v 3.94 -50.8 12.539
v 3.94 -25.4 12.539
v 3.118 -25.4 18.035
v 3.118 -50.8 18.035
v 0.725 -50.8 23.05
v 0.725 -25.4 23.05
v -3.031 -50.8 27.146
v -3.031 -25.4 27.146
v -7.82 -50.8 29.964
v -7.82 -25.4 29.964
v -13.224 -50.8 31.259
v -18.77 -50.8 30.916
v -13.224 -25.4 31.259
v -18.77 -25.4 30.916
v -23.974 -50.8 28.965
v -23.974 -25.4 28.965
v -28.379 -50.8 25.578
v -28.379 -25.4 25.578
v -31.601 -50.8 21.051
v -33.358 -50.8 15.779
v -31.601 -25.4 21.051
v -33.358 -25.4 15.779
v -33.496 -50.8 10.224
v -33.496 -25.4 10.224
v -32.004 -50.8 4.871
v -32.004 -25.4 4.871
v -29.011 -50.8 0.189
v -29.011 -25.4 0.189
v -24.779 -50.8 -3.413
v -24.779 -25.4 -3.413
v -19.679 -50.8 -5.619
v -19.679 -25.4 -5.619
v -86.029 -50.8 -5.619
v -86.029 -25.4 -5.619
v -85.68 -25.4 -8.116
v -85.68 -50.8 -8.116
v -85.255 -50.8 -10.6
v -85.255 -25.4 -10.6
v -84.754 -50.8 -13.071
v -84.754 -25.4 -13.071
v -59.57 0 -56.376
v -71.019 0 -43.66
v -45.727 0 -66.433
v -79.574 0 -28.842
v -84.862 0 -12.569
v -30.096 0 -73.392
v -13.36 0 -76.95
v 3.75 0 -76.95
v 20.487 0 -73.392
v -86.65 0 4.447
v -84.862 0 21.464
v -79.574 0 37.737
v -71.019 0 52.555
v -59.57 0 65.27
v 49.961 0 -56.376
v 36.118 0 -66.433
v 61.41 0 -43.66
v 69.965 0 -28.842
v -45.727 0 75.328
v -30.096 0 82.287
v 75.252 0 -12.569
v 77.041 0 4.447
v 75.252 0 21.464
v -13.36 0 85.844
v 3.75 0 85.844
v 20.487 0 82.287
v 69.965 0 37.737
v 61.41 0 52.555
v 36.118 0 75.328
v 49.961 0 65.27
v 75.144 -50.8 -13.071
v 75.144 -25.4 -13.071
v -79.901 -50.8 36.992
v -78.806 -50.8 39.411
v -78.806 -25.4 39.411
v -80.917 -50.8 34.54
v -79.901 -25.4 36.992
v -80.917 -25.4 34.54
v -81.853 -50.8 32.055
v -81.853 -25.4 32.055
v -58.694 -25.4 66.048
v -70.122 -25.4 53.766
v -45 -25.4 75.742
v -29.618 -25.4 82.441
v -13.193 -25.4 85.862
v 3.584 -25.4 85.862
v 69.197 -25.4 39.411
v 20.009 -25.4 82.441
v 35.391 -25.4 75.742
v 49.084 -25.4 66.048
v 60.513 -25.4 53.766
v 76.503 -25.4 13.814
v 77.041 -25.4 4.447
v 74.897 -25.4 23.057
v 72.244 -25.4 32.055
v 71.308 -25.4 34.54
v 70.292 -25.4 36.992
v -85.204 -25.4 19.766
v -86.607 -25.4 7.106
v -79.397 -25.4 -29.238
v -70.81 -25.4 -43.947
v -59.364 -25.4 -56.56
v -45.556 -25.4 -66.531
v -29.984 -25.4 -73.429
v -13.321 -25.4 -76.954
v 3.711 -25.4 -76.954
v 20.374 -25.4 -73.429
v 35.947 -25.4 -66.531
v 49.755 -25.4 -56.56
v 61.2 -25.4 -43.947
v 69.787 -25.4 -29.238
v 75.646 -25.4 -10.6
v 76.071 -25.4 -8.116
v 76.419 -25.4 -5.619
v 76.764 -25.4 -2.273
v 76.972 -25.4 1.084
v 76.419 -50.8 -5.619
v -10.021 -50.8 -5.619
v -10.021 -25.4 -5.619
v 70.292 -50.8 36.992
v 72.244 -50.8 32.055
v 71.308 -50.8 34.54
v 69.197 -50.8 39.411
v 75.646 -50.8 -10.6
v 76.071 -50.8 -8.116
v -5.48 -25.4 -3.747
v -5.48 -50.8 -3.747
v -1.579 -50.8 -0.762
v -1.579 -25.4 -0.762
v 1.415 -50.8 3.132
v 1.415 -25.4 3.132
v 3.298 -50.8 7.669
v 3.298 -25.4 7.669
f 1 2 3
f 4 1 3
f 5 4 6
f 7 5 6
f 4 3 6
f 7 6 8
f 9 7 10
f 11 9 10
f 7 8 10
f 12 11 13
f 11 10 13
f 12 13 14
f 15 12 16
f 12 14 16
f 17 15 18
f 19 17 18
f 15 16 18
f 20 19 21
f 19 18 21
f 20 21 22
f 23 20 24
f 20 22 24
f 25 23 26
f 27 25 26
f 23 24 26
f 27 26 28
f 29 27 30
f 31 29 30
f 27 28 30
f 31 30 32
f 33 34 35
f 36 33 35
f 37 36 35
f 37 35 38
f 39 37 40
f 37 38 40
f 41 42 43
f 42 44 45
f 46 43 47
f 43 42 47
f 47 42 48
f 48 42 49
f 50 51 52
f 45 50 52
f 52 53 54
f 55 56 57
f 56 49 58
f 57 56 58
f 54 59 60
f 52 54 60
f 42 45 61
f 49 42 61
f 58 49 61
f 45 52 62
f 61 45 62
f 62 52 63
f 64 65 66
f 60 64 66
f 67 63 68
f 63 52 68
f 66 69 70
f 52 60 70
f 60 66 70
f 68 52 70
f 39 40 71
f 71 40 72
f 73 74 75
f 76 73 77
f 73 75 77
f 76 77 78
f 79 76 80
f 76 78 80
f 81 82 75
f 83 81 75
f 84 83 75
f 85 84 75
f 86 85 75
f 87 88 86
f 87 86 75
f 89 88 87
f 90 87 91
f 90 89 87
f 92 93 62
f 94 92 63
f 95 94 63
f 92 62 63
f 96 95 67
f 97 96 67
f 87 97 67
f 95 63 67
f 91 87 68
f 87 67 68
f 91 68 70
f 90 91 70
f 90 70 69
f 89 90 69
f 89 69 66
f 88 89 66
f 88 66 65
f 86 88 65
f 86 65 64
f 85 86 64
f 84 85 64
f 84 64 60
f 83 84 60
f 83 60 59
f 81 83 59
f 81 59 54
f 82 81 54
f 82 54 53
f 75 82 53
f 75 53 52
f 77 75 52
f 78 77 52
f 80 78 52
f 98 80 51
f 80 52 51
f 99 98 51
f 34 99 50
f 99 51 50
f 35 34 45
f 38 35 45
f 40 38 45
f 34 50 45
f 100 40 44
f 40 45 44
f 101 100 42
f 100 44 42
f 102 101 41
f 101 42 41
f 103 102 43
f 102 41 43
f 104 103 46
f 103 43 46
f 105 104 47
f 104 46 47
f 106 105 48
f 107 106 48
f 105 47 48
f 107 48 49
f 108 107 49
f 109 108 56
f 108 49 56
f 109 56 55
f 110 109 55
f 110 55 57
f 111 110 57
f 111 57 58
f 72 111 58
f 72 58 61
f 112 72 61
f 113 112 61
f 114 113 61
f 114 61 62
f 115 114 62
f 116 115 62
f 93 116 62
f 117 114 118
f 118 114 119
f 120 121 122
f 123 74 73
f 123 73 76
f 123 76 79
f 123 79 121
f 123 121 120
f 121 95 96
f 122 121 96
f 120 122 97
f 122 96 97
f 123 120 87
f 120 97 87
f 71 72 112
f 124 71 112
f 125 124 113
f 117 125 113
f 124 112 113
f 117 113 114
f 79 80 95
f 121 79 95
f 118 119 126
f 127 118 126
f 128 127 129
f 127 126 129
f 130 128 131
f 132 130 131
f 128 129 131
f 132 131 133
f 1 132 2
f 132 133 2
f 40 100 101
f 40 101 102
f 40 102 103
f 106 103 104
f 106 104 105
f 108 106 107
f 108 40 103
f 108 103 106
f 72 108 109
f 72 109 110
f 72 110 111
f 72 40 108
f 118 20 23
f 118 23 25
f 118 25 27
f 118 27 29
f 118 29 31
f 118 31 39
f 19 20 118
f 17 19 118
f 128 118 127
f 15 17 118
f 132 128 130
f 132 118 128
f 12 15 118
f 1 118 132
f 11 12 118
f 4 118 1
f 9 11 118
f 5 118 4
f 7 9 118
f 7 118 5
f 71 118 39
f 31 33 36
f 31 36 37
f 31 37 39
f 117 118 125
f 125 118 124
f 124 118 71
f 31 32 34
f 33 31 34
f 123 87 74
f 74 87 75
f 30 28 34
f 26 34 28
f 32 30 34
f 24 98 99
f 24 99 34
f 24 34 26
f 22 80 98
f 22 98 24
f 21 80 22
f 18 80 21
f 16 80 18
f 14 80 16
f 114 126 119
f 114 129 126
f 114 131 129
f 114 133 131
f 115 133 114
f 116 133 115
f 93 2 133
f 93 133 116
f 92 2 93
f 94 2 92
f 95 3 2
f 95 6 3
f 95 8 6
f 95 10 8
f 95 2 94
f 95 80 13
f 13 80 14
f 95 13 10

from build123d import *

# Parameters (mm, degrees)
F0_R     = 81.8455494857
F1_DEPTH = 25.4
F3_DEPTH = 25.4


with BuildPart() as f1:
    # F0 (on Front) → F1 (new body)
    with BuildSketch(Plane.XZ):
        with Locations((-4.8047169112, 4.4472948648)):
            Circle(F0_R)
    extrude(amount=F1_DEPTH)

    # F2 (on face) → F3 (join)
    with BuildSketch(Plane.XZ.offset(25.4)):
        with BuildLine():
            ThreePointArc((-10.0211519488, -5.6191812157), (0.0460571122, 1.0869034824), (3.9396910589, 12.539409101))
            ThreePointArc((3.9396910589, 12.539409101), (-26.3024943623, 27.4354549568), (-19.6788255386, -5.6191812157))
            Line((-19.6788255386, -5.6191812157), (-10.0211519488, -5.6191812157))
        make_face()
        with BuildLine():
            Line((-10.0211519488, -5.6191812157), (-19.6788255386, -5.6191812157))
            ThreePointArc((-19.6788255386, -5.6191812157), (-14.8499887437, -6.2502707016), (-10.0211519488, -5.6191812157))
        make_face()
        with BuildLine():
            ThreePointArc((-78.8063776433, 39.4108212817), (-80.4193323461, 35.7701922921), (-81.8533073255, 32.0554220338))
            Line((-81.8533073255, 32.0554220338), (72.2438735032, 32.0554220338))
            ThreePointArc((72.2438735032, 32.0554220338), (70.8098985238, 35.7701922921), (69.1969438209, 39.4108212817))
            Line((69.1969438209, 39.4108212817), (-78.8063776433, 39.4108212817))
        make_face()
        with BuildLine():
            Line((-19.6788255386, -5.6191812157), (-86.0288514399, -5.6191812157))
            ThreePointArc((-86.0288514399, -5.6191812157), (-85.4772635025, -9.3597394685), (-84.7535081589, -13.0708314233))
            Line((-84.7535081589, -13.0708314233), (75.1440743365, -13.0708314233))
            ThreePointArc((75.1440743365, -13.0708314233), (75.8678296802, -9.3597394685), (76.4194176175, -5.6191812157))
            Line((76.4194176175, -5.6191812157), (-10.0211519488, -5.6191812157))
            ThreePointArc((-10.0211519488, -5.6191812157), (-14.8499887437, -6.2502707016), (-19.6788255386, -5.6191812157))
        make_face()
    extrude(amount=F3_DEPTH)


solid = f1.part
